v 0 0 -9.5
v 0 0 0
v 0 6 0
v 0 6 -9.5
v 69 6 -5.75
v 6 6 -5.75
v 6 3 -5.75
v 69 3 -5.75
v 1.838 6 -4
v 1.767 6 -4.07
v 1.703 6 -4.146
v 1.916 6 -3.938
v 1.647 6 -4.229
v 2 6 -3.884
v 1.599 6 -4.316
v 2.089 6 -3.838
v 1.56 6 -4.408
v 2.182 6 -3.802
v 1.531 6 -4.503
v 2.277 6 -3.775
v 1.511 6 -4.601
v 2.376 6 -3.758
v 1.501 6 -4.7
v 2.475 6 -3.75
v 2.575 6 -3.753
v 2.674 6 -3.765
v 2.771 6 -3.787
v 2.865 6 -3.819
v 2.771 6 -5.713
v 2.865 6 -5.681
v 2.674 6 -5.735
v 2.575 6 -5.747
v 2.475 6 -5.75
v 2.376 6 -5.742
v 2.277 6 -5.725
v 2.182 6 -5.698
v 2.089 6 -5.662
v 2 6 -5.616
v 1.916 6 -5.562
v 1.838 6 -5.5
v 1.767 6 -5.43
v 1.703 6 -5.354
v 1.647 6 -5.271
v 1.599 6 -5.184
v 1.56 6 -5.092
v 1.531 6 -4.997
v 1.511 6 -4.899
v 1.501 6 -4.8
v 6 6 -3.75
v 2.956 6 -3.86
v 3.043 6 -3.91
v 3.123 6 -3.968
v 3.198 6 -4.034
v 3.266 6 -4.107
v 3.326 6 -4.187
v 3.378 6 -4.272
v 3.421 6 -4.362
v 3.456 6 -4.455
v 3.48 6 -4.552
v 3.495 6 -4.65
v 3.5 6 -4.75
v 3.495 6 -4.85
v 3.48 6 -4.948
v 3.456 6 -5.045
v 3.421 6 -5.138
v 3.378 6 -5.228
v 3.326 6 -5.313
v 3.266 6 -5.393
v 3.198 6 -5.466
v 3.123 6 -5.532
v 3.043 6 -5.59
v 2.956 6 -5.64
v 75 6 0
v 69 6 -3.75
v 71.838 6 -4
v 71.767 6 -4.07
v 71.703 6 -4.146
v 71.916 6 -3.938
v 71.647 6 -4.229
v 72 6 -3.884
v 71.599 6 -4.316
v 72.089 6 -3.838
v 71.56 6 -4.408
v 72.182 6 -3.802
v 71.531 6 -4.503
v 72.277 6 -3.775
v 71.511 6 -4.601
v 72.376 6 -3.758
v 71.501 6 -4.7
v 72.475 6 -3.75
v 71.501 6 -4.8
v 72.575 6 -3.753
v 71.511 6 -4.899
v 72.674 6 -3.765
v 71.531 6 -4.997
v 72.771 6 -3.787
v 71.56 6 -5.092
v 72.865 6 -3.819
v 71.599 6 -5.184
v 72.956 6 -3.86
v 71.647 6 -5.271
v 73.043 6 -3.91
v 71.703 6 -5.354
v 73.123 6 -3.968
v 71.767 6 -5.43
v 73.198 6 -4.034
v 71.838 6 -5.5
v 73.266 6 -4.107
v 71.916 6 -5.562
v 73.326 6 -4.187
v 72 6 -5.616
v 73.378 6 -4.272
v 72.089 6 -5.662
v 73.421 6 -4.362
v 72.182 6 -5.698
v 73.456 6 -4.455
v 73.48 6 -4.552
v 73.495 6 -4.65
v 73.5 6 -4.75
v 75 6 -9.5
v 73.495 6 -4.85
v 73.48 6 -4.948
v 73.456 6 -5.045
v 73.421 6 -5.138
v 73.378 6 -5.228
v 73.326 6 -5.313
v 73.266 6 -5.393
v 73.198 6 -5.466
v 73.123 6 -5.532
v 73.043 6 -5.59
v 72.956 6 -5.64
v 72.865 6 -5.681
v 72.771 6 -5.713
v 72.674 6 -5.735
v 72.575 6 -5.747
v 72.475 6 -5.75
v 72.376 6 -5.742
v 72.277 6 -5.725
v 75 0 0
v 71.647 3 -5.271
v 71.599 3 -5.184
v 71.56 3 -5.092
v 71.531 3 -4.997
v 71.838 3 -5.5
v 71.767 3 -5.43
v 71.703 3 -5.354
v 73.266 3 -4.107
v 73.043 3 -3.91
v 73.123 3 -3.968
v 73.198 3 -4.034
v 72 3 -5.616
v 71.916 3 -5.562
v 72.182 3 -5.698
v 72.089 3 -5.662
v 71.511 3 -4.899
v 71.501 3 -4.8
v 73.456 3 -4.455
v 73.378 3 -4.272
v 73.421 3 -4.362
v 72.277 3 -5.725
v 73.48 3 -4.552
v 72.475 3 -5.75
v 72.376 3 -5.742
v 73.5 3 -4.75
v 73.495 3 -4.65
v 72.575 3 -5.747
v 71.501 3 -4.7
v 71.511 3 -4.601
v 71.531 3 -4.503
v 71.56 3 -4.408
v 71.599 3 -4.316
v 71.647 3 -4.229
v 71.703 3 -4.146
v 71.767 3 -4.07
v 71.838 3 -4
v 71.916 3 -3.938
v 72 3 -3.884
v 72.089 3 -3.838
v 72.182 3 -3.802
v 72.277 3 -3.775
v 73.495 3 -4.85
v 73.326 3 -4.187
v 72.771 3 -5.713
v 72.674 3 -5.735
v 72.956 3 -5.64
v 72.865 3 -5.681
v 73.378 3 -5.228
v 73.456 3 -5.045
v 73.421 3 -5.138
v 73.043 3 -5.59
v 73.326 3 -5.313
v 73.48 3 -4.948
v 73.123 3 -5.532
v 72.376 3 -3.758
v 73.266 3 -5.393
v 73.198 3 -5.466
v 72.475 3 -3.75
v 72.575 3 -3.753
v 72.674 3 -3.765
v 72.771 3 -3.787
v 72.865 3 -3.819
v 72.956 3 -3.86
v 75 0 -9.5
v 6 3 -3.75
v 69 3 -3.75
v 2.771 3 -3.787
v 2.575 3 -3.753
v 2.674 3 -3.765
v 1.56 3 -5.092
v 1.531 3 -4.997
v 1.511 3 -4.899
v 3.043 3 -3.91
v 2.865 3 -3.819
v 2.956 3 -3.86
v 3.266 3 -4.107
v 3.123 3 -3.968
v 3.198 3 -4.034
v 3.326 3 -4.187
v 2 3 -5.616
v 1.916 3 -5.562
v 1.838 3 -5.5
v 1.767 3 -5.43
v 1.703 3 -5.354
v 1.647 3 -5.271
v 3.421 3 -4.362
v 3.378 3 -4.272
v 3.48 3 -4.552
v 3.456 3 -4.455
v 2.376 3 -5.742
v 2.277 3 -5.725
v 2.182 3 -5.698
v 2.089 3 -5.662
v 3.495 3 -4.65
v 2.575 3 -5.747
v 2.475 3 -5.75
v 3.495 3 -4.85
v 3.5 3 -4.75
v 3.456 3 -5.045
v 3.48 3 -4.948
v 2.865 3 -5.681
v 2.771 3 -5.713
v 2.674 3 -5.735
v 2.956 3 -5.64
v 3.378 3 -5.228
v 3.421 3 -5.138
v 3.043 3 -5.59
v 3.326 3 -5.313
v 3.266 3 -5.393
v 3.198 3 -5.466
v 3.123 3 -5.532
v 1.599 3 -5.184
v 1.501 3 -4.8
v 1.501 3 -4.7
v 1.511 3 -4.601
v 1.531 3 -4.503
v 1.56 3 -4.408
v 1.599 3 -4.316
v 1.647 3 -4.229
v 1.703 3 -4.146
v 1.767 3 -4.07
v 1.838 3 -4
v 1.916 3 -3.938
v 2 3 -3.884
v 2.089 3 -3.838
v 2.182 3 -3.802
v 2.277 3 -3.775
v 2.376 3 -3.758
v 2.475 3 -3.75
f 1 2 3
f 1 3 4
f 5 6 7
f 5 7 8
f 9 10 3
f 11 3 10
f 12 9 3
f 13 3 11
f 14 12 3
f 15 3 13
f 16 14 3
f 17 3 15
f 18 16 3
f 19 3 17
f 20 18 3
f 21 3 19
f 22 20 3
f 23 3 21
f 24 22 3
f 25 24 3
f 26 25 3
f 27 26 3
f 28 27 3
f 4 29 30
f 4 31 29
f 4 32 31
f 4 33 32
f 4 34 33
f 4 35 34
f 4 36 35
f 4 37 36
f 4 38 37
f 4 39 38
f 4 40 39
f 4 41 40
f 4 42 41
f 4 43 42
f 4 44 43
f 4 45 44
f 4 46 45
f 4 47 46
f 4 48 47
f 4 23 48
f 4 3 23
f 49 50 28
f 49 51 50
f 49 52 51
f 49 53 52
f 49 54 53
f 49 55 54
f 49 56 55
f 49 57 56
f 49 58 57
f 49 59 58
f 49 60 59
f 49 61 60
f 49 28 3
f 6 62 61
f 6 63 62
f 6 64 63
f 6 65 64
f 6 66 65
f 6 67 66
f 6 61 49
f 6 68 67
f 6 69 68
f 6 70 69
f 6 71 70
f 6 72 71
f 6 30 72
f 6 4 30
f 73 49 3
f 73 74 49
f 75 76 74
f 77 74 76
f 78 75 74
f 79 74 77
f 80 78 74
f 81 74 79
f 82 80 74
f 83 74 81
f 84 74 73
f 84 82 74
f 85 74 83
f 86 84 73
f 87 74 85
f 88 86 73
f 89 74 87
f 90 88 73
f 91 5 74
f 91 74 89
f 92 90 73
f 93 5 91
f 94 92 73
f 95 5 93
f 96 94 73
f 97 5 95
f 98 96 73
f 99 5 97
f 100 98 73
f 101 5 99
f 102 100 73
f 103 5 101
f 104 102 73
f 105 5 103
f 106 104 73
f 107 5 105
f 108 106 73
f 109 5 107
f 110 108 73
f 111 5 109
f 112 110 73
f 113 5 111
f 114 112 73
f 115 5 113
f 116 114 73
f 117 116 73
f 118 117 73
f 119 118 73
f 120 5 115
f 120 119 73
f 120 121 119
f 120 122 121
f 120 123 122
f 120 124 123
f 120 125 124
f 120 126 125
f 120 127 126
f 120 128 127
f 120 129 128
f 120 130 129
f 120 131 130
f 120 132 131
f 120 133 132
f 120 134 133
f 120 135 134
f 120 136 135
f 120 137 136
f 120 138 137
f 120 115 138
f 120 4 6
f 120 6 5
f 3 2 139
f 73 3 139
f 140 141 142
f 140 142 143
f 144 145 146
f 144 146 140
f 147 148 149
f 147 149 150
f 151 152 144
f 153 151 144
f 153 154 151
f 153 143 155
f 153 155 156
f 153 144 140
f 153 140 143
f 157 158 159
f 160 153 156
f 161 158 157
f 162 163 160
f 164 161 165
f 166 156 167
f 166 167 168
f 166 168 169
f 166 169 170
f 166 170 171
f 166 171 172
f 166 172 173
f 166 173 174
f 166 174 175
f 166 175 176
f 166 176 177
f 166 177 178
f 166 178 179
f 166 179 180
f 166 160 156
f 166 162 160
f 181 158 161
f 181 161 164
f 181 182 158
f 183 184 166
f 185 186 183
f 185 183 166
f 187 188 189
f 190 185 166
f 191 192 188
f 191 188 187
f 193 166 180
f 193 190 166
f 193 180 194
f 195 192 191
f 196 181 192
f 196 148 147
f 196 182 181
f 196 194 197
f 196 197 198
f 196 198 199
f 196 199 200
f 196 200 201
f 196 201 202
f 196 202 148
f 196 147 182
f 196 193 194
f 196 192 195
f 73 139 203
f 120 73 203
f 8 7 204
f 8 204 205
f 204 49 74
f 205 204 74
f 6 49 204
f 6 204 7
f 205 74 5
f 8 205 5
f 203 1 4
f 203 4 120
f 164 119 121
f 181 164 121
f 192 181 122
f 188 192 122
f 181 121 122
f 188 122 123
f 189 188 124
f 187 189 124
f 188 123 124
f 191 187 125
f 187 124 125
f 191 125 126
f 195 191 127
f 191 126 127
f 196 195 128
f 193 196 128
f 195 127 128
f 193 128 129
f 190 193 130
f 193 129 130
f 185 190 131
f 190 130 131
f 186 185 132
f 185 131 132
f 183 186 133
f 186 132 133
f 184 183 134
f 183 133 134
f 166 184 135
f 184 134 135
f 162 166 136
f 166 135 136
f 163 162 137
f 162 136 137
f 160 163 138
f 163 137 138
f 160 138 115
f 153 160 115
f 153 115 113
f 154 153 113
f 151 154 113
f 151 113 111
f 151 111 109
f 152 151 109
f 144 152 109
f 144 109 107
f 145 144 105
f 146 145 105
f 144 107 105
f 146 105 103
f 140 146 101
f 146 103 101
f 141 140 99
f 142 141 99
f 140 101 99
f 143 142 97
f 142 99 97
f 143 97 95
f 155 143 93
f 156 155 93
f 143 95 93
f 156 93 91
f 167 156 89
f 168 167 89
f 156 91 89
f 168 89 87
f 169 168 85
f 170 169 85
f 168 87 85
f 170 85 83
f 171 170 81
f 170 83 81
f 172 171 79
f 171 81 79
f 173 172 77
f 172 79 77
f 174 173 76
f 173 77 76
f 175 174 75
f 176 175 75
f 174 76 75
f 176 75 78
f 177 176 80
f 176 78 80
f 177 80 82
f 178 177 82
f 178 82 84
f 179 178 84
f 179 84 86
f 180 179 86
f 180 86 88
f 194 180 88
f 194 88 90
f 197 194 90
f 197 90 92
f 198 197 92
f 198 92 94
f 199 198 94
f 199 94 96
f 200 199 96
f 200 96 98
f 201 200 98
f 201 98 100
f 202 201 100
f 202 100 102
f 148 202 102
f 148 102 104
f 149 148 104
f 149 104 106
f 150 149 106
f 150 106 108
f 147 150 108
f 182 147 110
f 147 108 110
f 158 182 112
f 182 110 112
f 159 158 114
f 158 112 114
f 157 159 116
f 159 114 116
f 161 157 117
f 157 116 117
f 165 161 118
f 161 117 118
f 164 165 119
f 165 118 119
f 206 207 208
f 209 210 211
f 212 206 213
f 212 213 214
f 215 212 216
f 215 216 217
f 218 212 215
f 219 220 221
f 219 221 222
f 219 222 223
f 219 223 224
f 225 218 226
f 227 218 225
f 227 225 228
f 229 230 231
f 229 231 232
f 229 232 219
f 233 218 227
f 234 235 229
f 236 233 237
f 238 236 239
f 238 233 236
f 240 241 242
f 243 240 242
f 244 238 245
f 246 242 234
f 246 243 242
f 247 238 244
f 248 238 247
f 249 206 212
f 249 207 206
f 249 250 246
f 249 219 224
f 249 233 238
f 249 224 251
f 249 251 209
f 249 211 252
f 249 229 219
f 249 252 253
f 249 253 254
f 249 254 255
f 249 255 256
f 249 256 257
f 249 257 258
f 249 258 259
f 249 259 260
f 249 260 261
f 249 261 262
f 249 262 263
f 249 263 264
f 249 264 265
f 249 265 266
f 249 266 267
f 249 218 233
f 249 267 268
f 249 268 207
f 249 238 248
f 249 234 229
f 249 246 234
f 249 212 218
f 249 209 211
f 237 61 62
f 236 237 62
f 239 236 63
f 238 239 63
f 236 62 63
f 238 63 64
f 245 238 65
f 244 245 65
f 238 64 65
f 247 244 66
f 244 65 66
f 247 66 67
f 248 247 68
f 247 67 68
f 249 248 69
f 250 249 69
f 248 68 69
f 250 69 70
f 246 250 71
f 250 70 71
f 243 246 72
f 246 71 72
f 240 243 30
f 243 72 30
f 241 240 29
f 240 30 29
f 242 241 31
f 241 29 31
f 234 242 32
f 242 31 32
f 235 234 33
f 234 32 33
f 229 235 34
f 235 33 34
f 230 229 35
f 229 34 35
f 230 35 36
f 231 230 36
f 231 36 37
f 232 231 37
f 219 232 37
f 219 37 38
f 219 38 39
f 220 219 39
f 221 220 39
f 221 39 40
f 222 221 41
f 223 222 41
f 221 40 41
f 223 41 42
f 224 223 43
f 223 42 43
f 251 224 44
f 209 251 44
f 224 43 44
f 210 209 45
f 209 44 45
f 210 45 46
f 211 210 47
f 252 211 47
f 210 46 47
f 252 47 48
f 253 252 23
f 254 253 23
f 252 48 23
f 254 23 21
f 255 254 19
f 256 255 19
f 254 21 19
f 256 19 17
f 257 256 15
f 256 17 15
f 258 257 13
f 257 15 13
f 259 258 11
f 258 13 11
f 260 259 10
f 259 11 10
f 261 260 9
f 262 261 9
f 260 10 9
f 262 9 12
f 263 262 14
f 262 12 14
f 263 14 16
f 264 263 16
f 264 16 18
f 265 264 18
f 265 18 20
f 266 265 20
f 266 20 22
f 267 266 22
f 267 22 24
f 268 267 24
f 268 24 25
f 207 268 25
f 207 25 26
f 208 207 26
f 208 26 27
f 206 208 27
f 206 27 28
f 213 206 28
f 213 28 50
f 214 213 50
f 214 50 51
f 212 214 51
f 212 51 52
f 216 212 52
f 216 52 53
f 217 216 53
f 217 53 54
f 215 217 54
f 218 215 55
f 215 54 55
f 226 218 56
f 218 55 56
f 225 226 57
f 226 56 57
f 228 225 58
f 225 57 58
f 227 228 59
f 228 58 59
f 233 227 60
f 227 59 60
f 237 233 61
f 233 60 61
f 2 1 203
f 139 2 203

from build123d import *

# Parameters (mm, degrees)
SKETCH1_W           = 75
SKETCH1_H           = 9.5
BOSS_EXTRUDE1_DEPTH = 6
SKETCH2_R           = 1
SKETCH2_W           = 63
SKETCH2_H           = 2
CUT_EXTRUDE1_DEPTH  = 3


with BuildPart() as part:
    # Sketch1 → Boss-Extrude1 (new body)
    with BuildSketch(Plane(origin=(0, 0, 0), x_dir=(1, 0, 0), z_dir=(0, 1, 0))):
        with Locations((37.5, 4.75)):
            Rectangle(SKETCH1_W, SKETCH1_H)
    extrude(amount=BOSS_EXTRUDE1_DEPTH)

    # Sketch2 → Cut-Extrude1 (cut)
    with BuildSketch(Plane(origin=(0, 6, 0), x_dir=(1, 0, 0), z_dir=(0, 1, 0))):
        with Locations((2.5, 4.75)):
            Circle(SKETCH2_R)
        with Locations((72.5, 4.75)):
            Circle(SKETCH2_R)
        with Locations((37.5, 4.75)):
            Rectangle(SKETCH2_W, SKETCH2_H)
    extrude(amount=-CUT_EXTRUDE1_DEPTH, mode=Mode.SUBTRACT)


solid = part.part
